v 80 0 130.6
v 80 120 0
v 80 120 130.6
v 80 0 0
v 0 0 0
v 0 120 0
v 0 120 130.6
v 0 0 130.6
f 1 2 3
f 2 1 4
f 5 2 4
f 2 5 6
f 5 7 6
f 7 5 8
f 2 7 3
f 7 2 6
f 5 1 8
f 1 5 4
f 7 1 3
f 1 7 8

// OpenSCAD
// Architectural thermal visualization; dimensions are scaled.
color([0.9081,0,0.0919,0.75]) translate([0,0,0.00000]) cube([80.00000,120.00000,18.00000]);
color([0.9958,0,0.0042,0.75]) translate([0,0,18.00000]) cube([80.00000,120.00000,10.00000]);
color([1.0000,0,0.0000,0.75]) translate([0,0,28.00000]) cube([80.00000,120.00000,10.00000]);
color([0.9625,0,0.0375,0.75]) translate([0,0,38.00000]) cube([80.00000,120.00000,1.50000]);
color([0.9303,0,0.0697,0.75]) translate([0,0,39.50000]) cube([80.00000,120.00000,3.20000]);
color([0.9003,0,0.0997,0.75]) translate([0,0,42.70000]) cube([80.00000,120.00000,1.50000]);
color([0.8703,0,0.1297,0.75]) translate([0,0,44.20000]) cube([80.00000,120.00000,3.20000]);
color([0.8422,0,0.1578,0.75]) translate([0,0,47.40000]) cube([80.00000,120.00000,1.50000]);
color([0.8141,0,0.1859,0.75]) translate([0,0,48.90000]) cube([80.00000,120.00000,3.20000]);
color([0.7877,0,0.2123,0.75]) translate([0,0,52.10000]) cube([80.00000,120.00000,1.50000]);
color([0.7612,0,0.2388,0.75]) translate([0,0,53.60000]) cube([80.00000,120.00000,3.20000]);
color([0.7361,0,0.2639,0.75]) translate([0,0,56.80000]) cube([80.00000,120.00000,1.50000]);
color([0.7110,0,0.2890,0.75]) translate([0,0,58.30000]) cube([80.00000,120.00000,3.20000]);
color([0.6871,0,0.3129,0.75]) translate([0,0,61.50000]) cube([80.00000,120.00000,1.50000]);
color([0.6631,0,0.3369,0.75]) translate([0,0,63.00000]) cube([80.00000,120.00000,3.20000]);
color([0.6405,0,0.3595,0.75]) translate([0,0,66.20000]) cube([80.00000,120.00000,1.50000]);
color([0.6180,0,0.3820,0.75]) translate([0,0,67.70000]) cube([80.00000,120.00000,3.20000]);
color([0.5963,0,0.4037,0.75]) translate([0,0,70.90000]) cube([80.00000,120.00000,1.50000]);
color([0.5747,0,0.4253,0.75]) translate([0,0,72.40000]) cube([80.00000,120.00000,3.20000]);
color([0.4966,0,0.5034,0.75]) translate([0,0,75.60000]) cube([80.00000,120.00000,5.00000]);
color([0.4224,0,0.5776,0.75]) translate([0,0,80.60000]) cube([80.00000,120.00000,50.00000]);
